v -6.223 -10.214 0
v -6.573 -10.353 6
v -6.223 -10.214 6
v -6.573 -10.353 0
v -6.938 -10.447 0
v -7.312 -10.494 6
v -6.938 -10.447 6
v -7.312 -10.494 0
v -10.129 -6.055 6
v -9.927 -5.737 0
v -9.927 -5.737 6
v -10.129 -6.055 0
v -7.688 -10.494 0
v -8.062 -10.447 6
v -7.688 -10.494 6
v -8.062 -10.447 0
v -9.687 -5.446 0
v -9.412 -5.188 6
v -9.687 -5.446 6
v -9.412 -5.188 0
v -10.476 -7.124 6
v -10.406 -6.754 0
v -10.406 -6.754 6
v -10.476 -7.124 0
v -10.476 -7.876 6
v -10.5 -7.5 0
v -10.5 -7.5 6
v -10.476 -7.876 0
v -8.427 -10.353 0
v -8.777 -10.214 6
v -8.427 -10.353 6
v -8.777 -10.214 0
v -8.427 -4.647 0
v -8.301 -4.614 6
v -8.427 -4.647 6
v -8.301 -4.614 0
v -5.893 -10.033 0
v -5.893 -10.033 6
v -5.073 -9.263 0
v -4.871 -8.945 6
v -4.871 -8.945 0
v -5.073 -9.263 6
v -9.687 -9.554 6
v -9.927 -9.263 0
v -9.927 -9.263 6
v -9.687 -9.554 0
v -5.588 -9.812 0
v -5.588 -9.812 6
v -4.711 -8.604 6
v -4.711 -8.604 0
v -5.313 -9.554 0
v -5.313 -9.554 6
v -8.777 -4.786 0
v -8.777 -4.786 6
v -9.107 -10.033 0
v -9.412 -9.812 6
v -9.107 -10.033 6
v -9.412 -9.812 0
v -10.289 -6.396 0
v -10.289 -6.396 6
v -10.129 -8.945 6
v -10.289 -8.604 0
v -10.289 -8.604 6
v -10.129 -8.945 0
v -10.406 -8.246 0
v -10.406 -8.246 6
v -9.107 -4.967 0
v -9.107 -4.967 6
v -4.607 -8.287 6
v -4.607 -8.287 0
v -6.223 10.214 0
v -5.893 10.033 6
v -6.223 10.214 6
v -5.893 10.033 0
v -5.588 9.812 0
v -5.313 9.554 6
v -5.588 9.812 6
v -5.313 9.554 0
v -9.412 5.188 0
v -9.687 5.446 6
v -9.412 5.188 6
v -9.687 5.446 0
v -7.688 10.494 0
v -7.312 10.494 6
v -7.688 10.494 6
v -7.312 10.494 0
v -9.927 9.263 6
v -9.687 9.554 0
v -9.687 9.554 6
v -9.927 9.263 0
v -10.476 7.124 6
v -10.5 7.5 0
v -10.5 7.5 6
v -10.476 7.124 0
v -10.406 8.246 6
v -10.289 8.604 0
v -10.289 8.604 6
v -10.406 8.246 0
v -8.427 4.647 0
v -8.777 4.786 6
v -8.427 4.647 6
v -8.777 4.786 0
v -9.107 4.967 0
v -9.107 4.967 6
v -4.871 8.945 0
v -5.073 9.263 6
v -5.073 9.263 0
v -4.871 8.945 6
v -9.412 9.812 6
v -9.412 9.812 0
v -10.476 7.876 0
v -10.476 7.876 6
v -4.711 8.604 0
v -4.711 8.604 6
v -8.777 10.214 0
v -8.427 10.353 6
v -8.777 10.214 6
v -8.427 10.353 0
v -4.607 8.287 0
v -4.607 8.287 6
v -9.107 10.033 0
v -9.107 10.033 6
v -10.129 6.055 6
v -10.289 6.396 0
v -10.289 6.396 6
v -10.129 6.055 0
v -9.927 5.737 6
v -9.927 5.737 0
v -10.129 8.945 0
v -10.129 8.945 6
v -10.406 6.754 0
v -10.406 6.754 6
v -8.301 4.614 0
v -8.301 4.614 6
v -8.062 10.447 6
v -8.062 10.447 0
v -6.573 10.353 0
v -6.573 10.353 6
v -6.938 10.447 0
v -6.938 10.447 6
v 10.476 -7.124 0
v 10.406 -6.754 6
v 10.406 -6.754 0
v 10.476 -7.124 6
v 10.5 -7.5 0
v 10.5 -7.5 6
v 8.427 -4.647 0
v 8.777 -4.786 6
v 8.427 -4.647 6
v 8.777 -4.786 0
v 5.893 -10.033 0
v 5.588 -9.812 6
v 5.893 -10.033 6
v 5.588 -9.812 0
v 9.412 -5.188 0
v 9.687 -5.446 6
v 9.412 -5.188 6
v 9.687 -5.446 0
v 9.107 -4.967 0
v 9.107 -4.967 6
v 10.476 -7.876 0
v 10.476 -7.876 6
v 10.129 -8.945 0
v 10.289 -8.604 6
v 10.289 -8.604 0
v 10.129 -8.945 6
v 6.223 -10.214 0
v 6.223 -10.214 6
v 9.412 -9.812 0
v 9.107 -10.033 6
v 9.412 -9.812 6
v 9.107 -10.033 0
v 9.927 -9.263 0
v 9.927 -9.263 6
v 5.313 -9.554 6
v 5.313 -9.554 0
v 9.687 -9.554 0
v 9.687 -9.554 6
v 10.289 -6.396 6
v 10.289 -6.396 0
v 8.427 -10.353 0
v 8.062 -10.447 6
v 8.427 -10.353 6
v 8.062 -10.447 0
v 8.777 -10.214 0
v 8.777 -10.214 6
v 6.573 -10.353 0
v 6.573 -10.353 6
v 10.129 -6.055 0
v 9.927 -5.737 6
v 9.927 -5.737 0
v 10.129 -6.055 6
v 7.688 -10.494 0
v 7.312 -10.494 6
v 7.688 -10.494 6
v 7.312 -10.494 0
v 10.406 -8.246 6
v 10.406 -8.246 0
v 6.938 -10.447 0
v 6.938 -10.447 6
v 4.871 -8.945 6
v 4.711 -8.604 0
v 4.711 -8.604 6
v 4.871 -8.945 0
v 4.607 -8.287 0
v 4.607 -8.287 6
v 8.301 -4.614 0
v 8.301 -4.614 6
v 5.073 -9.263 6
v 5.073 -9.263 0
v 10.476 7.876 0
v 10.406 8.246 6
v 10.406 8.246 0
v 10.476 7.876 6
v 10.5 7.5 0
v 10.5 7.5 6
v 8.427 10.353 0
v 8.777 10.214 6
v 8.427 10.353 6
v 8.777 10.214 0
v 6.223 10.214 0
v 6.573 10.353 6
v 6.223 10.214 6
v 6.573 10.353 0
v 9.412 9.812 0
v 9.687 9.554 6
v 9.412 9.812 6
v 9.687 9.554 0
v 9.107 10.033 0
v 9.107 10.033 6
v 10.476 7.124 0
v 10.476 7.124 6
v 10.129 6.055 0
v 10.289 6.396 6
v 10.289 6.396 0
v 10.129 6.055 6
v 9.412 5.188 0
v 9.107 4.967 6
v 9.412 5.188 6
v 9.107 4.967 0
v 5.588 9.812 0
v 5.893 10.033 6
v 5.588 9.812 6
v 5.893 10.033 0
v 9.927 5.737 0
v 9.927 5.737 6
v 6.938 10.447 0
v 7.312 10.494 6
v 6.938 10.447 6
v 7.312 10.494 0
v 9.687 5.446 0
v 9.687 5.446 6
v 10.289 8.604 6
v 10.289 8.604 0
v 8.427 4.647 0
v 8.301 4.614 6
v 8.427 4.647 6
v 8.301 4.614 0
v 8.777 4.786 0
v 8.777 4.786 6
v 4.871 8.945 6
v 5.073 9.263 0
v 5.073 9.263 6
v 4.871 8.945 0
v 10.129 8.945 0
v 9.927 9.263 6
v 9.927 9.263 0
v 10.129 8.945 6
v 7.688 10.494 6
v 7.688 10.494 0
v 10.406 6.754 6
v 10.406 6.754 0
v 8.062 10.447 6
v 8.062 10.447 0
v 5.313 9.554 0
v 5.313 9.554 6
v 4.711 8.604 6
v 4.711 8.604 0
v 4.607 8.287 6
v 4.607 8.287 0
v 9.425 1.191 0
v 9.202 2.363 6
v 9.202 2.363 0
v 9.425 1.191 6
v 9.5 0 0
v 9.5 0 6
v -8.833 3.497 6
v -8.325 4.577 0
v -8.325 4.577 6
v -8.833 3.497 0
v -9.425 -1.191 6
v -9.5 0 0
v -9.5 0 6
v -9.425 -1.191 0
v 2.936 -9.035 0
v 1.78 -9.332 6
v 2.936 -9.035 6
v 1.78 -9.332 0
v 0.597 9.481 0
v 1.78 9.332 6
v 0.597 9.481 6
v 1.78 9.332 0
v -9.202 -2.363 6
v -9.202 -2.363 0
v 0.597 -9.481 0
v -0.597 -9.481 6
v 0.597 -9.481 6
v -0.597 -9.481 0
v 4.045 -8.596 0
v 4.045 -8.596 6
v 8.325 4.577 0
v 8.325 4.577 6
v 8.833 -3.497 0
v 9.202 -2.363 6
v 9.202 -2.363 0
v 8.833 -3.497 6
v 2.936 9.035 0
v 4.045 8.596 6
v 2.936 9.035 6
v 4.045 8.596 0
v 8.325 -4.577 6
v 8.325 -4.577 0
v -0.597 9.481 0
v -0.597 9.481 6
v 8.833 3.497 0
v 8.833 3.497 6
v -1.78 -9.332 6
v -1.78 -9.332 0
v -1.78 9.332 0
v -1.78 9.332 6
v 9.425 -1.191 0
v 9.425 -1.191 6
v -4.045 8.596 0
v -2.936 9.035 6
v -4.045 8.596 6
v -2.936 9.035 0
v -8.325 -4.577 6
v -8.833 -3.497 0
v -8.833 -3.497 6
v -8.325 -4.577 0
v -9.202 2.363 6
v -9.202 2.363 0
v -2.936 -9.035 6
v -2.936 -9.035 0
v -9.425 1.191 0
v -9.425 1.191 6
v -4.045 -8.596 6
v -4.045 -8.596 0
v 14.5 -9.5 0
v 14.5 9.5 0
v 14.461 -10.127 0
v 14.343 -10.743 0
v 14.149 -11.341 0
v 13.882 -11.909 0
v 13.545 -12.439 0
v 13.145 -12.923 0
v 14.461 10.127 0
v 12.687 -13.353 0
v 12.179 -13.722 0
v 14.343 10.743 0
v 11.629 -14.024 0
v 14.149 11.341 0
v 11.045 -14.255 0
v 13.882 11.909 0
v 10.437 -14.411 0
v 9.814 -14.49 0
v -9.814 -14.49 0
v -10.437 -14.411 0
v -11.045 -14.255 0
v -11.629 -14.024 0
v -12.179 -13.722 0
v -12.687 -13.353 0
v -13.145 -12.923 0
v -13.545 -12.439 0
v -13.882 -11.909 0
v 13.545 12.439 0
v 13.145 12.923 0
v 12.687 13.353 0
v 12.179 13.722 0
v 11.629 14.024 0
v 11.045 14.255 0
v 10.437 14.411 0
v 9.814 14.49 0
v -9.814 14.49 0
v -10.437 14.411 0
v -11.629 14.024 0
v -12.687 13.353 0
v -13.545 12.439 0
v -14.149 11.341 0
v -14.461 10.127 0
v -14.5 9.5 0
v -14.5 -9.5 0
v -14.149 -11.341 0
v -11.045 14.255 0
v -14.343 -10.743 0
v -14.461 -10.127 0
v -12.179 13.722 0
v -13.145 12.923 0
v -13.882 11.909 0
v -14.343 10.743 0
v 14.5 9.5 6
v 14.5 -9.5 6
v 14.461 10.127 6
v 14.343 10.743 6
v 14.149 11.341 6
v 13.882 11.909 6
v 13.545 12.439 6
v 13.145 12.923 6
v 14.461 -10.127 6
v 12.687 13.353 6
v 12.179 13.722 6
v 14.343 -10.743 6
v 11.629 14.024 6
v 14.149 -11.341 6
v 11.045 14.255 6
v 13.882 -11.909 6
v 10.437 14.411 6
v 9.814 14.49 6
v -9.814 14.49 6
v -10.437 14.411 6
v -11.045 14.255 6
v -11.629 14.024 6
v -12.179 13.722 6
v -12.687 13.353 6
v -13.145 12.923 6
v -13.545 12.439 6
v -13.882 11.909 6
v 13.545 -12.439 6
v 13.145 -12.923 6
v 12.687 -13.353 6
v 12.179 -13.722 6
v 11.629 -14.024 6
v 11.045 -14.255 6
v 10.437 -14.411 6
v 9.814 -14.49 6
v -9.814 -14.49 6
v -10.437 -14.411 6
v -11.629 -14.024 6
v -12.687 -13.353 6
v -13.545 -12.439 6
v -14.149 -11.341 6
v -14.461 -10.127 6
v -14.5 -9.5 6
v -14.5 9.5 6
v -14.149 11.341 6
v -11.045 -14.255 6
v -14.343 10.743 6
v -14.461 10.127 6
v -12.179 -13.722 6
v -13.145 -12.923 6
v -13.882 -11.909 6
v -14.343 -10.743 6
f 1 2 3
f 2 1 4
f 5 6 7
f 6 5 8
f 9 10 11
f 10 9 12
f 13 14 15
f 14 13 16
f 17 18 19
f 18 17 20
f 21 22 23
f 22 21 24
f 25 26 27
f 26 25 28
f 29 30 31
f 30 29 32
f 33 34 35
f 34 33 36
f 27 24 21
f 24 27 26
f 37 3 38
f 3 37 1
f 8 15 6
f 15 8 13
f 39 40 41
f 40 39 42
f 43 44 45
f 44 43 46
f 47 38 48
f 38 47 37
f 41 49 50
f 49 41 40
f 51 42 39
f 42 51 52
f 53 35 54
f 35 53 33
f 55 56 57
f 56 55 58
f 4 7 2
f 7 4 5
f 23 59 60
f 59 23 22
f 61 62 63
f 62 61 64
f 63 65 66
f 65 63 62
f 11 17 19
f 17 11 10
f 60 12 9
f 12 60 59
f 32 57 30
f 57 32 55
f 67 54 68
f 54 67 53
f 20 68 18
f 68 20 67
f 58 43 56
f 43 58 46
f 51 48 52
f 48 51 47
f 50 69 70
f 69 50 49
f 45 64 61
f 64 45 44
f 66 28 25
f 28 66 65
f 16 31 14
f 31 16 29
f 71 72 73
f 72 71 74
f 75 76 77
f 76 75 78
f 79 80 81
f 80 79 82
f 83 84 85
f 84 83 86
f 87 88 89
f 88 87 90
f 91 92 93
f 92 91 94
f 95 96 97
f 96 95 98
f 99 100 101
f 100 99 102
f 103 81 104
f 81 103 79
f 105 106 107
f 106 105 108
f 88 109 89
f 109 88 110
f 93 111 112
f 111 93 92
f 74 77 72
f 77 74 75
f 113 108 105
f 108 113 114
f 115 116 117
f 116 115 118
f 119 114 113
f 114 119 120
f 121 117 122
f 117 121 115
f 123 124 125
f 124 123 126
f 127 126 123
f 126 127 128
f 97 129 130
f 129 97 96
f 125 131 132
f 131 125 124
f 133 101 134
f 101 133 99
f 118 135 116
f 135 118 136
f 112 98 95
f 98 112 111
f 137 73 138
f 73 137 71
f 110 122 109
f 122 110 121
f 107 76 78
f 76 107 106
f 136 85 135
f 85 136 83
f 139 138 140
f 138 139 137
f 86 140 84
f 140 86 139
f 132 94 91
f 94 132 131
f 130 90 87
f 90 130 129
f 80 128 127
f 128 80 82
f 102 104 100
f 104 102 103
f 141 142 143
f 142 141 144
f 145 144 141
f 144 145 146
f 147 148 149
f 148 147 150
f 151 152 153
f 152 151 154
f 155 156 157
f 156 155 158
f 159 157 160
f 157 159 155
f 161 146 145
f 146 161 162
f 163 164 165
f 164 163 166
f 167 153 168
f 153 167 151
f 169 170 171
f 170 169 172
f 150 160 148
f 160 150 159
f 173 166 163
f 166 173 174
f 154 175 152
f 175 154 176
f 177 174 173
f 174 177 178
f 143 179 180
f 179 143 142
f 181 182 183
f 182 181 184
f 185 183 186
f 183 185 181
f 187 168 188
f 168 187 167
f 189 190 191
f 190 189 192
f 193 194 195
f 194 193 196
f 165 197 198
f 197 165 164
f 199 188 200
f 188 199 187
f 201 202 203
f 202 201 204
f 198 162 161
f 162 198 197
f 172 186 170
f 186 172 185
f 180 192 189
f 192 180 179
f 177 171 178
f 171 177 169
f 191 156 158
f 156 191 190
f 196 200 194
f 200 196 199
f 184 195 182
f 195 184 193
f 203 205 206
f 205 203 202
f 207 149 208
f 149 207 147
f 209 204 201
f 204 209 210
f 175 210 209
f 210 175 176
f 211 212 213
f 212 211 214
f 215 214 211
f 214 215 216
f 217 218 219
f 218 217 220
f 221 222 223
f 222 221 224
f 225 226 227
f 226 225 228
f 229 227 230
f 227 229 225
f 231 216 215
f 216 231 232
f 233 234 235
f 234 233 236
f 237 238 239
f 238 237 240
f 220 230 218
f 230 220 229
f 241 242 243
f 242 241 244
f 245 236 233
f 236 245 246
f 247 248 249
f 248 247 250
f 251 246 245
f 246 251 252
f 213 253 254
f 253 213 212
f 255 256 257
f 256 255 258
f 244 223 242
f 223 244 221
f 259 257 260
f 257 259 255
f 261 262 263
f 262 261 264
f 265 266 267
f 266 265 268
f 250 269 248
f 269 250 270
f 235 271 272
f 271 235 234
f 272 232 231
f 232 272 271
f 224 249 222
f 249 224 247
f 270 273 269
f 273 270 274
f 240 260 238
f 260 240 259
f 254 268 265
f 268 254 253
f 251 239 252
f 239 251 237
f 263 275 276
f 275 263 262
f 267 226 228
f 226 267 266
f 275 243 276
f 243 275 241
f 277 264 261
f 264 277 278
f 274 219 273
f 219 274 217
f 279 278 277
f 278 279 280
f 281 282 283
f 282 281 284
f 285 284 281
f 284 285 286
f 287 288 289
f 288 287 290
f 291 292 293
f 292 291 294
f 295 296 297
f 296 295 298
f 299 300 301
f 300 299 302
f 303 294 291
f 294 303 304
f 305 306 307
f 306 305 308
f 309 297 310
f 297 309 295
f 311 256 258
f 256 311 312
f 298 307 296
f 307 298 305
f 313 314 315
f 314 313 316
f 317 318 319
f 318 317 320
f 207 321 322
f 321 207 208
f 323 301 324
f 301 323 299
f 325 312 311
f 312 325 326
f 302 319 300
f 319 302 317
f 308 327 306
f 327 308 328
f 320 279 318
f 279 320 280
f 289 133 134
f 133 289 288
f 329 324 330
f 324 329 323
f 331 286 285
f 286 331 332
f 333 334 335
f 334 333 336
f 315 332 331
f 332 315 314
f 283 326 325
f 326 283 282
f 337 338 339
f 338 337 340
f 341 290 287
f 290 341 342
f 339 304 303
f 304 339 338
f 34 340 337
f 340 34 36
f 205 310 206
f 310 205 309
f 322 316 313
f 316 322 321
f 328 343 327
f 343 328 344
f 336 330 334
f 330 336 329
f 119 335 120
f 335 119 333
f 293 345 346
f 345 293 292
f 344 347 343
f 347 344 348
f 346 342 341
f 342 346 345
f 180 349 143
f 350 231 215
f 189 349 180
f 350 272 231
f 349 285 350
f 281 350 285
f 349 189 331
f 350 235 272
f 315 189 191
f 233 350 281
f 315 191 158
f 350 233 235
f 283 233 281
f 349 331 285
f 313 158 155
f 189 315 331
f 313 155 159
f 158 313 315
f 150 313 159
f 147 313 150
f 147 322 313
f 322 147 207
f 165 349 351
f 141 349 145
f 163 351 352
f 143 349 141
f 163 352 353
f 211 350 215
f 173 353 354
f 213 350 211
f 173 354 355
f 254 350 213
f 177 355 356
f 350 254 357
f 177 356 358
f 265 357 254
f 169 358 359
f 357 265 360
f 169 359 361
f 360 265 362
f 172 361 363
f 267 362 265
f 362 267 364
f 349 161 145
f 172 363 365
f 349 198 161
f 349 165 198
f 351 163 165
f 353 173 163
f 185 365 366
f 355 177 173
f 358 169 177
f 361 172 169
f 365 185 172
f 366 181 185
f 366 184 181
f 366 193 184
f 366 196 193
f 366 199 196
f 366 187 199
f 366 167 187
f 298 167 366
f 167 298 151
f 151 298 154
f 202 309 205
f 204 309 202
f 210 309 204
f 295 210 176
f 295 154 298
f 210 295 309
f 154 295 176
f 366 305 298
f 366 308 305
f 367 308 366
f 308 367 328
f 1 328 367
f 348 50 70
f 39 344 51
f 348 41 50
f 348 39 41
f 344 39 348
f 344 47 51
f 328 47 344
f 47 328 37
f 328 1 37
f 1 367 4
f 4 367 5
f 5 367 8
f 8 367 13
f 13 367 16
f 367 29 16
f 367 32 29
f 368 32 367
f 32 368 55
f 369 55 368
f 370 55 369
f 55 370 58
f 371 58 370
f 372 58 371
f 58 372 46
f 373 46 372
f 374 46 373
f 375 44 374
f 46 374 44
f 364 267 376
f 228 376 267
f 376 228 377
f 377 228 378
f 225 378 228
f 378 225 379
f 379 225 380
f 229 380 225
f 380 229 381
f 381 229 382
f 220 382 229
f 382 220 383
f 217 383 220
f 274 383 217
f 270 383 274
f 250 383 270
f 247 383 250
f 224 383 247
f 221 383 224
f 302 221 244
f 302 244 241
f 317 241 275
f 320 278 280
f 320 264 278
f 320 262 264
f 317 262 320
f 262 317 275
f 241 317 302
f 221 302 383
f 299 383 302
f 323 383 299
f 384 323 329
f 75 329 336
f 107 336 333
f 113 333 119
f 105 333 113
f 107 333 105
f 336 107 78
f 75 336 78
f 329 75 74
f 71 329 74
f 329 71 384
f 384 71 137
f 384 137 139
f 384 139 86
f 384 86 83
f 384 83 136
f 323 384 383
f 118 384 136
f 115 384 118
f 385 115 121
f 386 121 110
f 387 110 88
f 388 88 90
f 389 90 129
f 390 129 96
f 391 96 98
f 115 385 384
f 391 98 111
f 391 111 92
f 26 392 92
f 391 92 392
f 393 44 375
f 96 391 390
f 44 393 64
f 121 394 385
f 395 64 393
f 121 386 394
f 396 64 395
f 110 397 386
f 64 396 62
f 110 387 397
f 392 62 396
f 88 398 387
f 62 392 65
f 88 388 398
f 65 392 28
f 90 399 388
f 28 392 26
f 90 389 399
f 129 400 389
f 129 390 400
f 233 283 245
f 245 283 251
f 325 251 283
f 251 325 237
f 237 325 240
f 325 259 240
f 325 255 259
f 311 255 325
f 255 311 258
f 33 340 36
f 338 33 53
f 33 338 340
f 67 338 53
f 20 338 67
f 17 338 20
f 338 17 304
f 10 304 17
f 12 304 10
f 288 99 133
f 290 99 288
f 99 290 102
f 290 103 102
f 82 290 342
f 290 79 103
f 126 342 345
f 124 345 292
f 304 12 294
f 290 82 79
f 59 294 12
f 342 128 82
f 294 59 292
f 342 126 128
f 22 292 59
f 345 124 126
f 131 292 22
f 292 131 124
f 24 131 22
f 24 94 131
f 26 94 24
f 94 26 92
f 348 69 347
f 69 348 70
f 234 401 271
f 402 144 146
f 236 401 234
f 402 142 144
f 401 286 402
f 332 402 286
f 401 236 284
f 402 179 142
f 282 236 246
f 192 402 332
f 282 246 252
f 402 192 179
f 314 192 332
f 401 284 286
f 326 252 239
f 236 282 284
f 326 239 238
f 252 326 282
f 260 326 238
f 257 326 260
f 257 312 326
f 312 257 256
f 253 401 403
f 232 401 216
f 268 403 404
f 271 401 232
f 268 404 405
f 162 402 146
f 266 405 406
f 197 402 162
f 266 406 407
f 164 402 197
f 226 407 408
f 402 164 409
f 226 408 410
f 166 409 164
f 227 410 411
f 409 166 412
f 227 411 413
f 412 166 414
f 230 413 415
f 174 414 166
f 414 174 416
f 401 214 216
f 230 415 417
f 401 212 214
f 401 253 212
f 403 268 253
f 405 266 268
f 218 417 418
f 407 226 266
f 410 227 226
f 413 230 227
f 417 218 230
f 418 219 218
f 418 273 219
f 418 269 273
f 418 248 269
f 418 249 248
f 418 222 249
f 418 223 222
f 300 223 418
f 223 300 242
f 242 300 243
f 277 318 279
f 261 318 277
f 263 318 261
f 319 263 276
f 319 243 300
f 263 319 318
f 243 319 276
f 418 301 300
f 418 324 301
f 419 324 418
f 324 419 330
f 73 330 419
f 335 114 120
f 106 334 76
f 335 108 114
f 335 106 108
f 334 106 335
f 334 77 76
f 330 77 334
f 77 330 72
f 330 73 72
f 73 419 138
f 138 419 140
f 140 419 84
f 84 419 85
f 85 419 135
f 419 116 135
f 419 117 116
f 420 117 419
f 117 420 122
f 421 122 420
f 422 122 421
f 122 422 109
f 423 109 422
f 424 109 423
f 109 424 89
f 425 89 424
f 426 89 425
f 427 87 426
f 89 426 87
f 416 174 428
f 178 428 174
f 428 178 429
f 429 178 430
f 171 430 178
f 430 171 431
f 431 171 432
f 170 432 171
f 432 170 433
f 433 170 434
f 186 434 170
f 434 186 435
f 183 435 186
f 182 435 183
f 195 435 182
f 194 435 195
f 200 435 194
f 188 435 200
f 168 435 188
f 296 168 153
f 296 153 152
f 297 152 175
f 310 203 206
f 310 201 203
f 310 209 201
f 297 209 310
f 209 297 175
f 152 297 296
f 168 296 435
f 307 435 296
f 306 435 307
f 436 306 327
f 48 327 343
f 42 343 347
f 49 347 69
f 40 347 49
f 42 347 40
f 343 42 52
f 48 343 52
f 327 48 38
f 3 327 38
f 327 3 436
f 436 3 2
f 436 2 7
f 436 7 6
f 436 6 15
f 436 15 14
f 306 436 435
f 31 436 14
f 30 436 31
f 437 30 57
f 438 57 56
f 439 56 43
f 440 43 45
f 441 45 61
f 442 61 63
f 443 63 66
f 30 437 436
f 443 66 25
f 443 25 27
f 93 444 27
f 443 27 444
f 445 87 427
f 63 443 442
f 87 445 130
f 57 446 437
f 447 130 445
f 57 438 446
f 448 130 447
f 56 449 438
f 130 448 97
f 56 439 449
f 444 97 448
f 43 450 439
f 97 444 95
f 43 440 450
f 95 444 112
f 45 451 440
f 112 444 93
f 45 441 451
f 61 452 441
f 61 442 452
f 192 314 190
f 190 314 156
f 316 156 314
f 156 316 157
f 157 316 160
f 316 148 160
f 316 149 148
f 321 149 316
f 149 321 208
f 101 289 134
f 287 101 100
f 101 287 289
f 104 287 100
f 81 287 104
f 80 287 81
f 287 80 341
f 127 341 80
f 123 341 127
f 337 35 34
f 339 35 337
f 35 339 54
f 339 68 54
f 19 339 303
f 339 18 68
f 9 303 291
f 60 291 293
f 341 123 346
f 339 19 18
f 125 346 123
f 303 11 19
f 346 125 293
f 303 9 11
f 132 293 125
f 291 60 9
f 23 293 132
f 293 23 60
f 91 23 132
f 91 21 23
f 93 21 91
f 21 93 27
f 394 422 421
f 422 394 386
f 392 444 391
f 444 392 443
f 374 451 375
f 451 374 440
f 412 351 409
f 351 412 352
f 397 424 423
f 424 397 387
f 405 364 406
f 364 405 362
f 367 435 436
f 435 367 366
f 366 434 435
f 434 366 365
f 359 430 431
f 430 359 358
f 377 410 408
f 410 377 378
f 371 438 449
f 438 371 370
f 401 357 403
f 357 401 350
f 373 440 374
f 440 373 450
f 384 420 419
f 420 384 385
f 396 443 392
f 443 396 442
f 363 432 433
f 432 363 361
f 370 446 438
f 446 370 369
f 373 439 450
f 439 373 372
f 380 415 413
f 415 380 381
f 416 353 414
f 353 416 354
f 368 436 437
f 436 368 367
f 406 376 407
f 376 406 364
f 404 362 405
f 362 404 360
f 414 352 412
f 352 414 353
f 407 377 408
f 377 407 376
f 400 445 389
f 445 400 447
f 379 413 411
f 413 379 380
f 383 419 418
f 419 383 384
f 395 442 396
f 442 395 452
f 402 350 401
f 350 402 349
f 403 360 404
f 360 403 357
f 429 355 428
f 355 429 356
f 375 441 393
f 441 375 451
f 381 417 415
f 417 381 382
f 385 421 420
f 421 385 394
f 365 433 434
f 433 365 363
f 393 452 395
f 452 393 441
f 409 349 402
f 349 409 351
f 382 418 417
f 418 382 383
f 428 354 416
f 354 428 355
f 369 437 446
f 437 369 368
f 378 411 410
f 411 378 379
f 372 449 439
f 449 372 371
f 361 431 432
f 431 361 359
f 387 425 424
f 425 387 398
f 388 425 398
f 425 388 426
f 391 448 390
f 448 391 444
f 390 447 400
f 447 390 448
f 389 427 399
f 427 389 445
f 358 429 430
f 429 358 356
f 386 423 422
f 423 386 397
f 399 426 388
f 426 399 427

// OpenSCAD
$fn = 50;


difference() {
	union() {
		hull() {
			translate(v = [-9.5000000000, 9.5000000000, 0]) {
				cylinder(h = 6, r = 5);
			}
			translate(v = [9.5000000000, 9.5000000000, 0]) {
				cylinder(h = 6, r = 5);
			}
			translate(v = [-9.5000000000, -9.5000000000, 0]) {
				cylinder(h = 6, r = 5);
			}
			translate(v = [9.5000000000, -9.5000000000, 0]) {
				cylinder(h = 6, r = 5);
			}
		}
	}
	union() {
		#translate(v = [-7.5000000000, -7.5000000000, -100.0000000000]) {
			cylinder(h = 200, r = 3.0000000000);
		}
		#translate(v = [-7.5000000000, 7.5000000000, -100.0000000000]) {
			cylinder(h = 200, r = 3.0000000000);
		}
		#translate(v = [7.5000000000, -7.5000000000, -100.0000000000]) {
			cylinder(h = 200, r = 3.0000000000);
		}
		#translate(v = [7.5000000000, 7.5000000000, -100.0000000000]) {
			cylinder(h = 200, r = 3.0000000000);
		}
		#cylinder(h = 6, r = 9.5000000000);
	}
}
